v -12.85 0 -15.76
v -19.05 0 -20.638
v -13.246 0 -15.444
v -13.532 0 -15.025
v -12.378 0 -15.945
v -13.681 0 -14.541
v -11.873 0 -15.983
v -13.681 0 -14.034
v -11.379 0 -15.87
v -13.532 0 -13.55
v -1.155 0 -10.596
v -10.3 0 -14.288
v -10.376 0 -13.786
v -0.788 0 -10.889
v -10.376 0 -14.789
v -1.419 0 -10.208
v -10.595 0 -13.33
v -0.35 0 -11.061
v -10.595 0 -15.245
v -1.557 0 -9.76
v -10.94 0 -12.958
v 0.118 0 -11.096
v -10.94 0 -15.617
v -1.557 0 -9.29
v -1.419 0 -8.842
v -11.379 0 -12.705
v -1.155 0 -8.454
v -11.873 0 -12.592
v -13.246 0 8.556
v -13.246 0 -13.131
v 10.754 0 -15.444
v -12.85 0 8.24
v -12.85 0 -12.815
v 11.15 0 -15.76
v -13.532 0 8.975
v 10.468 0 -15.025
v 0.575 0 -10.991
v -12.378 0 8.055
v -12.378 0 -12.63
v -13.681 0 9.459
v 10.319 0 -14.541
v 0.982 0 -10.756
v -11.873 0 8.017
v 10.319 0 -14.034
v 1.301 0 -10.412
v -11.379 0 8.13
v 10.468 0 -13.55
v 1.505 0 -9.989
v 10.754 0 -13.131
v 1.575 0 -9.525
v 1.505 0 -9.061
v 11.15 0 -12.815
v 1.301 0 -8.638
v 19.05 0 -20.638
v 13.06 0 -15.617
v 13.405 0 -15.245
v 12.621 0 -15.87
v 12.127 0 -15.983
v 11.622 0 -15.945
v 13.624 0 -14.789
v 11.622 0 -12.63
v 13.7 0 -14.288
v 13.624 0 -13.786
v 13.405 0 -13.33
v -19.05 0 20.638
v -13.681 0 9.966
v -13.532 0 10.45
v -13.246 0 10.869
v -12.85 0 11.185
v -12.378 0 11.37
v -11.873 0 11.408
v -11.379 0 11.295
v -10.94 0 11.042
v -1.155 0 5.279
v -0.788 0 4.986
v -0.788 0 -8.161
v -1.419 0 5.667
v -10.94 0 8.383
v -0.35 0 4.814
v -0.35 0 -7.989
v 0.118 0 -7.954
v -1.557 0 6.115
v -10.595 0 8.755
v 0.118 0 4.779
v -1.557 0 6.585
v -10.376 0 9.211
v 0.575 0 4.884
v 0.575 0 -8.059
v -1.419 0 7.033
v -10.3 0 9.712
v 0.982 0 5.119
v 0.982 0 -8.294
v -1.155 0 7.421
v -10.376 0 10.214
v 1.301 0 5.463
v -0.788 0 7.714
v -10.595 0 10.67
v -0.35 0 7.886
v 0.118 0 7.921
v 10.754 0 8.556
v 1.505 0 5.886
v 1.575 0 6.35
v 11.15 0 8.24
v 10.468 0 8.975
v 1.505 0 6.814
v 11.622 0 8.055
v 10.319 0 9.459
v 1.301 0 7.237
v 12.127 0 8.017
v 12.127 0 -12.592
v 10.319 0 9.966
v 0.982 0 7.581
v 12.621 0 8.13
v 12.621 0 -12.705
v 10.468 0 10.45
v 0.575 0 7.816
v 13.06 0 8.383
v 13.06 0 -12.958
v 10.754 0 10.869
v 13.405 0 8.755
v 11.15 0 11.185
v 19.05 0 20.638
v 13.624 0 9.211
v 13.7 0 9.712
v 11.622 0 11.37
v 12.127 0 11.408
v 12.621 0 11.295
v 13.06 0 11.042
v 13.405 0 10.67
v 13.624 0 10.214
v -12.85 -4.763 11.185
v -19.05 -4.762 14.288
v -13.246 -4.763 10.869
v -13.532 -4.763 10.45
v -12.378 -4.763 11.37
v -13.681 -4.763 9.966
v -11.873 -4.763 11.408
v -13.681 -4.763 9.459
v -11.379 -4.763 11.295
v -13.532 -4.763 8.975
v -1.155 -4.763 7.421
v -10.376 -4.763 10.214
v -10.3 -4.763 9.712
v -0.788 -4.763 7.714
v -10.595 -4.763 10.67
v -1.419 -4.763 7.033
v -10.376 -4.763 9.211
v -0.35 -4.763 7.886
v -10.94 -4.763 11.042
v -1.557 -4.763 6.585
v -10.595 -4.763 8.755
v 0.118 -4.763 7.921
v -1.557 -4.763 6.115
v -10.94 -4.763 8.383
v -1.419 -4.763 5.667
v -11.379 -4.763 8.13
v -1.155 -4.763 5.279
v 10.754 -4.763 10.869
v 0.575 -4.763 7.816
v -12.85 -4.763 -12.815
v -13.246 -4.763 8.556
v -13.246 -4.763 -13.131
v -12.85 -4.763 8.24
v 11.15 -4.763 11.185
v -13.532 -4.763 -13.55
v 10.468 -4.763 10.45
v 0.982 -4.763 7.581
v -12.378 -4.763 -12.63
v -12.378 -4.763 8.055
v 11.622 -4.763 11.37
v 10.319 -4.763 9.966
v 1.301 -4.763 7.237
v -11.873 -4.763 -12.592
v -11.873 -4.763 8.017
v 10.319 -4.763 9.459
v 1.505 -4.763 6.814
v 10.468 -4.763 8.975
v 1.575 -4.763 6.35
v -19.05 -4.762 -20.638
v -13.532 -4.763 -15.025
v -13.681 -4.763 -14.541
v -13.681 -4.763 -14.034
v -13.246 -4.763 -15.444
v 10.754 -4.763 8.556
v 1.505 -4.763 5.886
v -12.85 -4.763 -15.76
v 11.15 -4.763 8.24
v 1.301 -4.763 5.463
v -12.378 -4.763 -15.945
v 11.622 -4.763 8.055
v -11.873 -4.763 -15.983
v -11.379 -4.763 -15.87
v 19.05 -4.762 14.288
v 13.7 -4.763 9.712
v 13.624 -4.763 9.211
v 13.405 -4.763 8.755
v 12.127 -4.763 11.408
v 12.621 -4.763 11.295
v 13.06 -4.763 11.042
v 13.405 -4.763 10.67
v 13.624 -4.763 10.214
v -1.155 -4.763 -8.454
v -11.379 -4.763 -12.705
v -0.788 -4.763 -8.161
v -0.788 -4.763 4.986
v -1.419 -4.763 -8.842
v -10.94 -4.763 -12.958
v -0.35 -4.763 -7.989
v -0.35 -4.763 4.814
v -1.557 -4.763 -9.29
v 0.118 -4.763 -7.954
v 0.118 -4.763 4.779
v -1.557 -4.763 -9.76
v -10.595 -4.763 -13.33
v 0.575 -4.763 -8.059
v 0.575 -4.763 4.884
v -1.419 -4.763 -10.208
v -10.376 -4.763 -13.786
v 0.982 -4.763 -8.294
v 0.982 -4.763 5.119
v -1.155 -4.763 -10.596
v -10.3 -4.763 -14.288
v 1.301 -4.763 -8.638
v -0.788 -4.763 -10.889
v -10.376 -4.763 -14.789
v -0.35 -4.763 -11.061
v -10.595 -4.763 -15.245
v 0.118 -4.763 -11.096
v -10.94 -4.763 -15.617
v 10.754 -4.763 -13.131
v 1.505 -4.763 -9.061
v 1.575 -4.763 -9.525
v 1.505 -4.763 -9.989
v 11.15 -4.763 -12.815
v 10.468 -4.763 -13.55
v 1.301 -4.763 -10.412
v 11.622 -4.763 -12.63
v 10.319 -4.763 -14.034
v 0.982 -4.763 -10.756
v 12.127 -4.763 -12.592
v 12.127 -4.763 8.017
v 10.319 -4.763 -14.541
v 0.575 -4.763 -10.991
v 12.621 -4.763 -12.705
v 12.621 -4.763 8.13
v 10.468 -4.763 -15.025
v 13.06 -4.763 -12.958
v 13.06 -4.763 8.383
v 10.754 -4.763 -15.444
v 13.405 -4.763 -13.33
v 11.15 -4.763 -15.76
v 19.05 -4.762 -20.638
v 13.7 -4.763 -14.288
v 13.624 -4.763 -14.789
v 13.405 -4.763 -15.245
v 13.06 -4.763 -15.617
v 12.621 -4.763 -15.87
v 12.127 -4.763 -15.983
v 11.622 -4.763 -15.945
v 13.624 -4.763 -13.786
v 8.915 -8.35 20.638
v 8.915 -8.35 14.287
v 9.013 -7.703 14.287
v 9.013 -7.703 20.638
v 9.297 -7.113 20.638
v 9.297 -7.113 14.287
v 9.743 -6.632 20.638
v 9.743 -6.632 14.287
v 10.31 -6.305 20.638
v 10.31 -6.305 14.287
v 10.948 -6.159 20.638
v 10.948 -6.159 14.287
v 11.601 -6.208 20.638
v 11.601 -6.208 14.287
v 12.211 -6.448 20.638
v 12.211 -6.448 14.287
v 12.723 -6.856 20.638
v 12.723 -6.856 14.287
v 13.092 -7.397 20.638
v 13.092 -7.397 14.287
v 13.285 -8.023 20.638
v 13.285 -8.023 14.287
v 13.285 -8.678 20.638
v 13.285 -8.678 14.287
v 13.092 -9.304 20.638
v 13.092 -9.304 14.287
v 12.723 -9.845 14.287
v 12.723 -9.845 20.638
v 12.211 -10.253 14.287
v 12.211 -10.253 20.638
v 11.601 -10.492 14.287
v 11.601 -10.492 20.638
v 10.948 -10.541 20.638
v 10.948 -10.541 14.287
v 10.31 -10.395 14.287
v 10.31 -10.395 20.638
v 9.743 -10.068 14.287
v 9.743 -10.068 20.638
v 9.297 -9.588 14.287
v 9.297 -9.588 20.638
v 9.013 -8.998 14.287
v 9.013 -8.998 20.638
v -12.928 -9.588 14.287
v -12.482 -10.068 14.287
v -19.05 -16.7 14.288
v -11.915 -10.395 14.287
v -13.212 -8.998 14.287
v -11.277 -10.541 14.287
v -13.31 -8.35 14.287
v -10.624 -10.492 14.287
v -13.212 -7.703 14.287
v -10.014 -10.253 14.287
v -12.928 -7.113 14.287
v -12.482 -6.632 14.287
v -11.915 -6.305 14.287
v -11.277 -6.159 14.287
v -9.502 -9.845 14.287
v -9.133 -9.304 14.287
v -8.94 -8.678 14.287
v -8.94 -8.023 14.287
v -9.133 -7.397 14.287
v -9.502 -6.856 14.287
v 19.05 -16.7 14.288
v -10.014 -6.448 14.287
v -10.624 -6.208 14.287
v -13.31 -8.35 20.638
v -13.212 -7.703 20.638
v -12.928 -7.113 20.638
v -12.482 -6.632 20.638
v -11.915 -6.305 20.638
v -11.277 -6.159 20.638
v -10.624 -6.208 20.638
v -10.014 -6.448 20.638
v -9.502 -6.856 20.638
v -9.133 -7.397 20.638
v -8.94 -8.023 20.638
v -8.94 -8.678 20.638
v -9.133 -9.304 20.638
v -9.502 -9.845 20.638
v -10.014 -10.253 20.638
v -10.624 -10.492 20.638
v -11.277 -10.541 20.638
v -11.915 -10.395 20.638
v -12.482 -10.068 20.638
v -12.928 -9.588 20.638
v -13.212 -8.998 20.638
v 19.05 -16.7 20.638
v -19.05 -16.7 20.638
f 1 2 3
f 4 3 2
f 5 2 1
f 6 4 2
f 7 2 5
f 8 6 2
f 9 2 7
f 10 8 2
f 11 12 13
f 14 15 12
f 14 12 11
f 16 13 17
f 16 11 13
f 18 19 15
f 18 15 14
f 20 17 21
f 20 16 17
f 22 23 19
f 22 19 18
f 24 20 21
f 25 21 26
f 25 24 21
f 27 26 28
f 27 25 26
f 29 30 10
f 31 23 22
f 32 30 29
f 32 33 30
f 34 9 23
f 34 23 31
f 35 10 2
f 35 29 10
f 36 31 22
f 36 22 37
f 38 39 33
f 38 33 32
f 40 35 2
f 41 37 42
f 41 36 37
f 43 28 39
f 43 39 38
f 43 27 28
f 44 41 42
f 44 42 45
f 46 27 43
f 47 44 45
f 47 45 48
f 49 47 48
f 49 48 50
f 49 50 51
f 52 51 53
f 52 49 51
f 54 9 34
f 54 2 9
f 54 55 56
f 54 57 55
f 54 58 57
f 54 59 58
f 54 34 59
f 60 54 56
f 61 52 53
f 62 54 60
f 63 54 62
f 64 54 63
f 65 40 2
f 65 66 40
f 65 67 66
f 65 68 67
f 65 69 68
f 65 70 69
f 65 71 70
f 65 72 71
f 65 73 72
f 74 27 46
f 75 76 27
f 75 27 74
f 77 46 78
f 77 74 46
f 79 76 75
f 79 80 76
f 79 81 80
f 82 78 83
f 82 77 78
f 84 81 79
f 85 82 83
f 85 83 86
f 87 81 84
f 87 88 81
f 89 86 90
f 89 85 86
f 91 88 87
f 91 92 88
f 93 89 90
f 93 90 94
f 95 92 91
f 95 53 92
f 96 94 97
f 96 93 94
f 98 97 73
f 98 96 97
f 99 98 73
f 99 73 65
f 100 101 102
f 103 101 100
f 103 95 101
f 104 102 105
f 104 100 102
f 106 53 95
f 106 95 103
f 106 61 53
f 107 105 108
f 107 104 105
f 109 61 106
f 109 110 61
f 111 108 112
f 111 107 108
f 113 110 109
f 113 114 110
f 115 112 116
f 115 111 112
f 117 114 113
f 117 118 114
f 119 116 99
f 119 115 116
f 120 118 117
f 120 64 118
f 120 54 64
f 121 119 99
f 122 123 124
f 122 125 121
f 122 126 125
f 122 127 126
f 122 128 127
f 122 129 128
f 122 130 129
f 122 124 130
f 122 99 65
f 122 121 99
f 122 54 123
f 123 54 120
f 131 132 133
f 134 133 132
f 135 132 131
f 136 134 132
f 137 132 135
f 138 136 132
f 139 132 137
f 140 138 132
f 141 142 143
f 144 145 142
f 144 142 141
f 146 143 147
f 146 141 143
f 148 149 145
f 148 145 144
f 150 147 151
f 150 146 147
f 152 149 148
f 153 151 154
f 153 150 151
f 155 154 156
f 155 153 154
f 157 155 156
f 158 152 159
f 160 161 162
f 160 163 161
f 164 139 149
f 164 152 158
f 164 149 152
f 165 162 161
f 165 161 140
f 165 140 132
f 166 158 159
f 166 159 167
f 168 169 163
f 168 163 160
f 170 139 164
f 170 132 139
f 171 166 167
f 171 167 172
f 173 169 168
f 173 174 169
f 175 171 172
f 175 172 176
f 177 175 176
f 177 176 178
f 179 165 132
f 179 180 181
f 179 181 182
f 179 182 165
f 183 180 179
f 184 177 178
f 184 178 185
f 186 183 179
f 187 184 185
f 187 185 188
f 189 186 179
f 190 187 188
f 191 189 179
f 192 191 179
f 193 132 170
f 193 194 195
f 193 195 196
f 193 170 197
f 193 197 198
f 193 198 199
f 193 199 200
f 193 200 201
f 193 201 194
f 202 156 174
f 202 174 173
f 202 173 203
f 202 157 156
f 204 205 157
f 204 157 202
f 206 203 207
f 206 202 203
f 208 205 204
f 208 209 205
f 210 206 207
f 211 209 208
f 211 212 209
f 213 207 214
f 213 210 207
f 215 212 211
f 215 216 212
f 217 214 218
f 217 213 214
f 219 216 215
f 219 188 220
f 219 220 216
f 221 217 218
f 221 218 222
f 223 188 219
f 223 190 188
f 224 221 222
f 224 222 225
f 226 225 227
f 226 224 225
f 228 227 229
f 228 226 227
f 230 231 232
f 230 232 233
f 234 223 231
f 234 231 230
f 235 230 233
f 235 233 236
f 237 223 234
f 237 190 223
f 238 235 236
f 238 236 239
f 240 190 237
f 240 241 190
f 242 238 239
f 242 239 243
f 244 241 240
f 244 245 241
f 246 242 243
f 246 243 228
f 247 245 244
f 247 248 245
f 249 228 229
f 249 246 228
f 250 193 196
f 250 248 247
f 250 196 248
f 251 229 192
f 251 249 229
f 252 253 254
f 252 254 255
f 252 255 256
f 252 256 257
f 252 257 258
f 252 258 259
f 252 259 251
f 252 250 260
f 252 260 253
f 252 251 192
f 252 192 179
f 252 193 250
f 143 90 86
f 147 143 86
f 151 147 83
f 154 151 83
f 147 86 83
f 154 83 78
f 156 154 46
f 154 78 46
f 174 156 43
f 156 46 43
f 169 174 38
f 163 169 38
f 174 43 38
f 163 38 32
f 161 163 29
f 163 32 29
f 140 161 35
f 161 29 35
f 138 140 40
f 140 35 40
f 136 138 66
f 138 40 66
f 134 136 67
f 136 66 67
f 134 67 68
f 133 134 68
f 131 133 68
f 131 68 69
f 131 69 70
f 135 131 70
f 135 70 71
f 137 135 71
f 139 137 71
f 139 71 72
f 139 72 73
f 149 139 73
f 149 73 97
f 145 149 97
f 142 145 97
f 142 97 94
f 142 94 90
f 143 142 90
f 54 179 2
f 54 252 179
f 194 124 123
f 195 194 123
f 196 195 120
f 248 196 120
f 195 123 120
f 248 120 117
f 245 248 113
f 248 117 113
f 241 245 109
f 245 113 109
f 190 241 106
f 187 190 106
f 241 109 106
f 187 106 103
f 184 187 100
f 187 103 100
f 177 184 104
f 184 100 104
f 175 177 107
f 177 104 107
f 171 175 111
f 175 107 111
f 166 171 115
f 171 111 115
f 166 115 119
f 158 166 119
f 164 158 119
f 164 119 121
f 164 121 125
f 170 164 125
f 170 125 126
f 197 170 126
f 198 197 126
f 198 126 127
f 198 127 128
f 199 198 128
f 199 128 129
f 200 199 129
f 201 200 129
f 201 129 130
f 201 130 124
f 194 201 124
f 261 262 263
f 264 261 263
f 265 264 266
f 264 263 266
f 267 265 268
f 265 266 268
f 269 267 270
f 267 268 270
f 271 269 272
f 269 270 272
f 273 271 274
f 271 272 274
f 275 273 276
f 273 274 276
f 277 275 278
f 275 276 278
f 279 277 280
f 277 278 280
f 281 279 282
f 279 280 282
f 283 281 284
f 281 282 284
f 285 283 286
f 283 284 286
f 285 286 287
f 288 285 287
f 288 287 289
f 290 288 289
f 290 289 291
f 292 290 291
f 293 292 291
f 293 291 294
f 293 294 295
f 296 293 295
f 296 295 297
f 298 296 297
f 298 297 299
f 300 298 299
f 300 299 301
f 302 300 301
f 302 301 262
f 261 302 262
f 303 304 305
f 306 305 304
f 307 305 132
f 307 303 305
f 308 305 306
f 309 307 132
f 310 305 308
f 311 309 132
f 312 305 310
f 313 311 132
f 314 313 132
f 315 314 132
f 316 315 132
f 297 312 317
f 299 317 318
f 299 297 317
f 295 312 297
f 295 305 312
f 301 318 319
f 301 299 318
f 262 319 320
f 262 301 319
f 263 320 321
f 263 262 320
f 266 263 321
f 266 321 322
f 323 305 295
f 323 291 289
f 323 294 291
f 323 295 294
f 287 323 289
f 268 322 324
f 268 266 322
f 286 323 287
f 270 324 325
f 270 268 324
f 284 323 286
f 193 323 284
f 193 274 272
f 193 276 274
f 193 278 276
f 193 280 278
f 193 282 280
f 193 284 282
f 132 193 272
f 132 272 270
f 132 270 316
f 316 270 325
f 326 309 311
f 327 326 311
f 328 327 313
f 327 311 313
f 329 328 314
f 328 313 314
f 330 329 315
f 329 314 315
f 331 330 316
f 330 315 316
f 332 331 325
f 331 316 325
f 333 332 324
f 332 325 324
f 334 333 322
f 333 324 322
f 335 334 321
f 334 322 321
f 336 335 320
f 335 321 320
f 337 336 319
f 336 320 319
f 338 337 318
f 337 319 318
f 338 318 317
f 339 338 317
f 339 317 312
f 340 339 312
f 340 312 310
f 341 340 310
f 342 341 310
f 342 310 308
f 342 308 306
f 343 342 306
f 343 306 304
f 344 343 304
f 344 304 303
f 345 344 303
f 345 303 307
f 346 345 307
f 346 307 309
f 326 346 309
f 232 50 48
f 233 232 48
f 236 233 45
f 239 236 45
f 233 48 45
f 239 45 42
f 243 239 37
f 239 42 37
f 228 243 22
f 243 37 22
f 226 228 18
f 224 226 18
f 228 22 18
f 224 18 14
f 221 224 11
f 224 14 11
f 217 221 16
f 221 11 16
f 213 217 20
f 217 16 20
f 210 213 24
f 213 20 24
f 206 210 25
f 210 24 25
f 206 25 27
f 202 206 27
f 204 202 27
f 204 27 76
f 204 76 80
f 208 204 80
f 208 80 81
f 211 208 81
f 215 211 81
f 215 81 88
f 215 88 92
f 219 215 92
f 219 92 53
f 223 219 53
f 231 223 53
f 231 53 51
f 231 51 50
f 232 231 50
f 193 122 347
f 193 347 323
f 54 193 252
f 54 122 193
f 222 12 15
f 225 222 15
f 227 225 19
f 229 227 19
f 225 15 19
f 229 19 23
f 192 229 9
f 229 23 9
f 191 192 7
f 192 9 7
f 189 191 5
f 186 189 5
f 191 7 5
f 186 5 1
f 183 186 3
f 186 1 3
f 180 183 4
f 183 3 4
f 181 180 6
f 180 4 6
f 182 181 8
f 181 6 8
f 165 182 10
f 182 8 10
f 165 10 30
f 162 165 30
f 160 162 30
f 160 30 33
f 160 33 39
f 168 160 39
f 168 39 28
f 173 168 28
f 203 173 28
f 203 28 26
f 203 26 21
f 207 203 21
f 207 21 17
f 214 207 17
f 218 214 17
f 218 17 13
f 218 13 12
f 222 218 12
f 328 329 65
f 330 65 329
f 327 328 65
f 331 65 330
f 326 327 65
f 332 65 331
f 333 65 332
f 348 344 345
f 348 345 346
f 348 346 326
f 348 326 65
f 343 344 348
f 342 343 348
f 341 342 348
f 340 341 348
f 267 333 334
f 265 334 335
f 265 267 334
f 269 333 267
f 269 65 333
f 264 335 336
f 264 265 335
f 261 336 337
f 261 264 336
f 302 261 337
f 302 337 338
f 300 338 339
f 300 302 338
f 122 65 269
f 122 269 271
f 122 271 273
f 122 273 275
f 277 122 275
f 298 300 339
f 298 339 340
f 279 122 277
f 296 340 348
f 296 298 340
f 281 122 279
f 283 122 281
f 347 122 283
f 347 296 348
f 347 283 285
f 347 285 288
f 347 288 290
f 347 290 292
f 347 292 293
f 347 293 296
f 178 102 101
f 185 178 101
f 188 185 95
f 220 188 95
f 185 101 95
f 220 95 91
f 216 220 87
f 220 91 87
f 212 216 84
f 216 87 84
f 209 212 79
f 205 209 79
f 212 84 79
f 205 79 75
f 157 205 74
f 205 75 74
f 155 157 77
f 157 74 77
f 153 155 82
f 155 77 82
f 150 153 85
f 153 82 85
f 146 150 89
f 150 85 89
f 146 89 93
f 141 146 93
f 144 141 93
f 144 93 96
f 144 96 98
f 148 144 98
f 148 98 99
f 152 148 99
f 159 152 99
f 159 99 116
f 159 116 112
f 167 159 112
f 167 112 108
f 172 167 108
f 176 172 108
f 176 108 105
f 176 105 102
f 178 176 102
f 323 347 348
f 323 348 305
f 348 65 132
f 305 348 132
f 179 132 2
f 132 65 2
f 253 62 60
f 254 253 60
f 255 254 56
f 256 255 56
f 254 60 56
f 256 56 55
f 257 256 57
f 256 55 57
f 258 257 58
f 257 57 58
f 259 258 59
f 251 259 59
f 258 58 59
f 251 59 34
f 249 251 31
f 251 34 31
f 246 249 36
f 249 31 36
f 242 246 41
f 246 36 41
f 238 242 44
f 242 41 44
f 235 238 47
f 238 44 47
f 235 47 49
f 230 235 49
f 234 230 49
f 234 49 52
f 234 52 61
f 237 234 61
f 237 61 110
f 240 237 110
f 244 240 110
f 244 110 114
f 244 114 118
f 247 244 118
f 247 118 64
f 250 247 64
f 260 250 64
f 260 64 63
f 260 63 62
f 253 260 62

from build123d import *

# Parameters (mm, degrees)
BOSS_EXTRUDE1_DEPTH                = 19.05
M3_CLEARANCE_HOLE1_D               = 3.4
TAPPED_HOLE_FOR_M3X0_5_HELICOIL1_D = 3.15
TAPPED_HOLE_FOR_8_32_HELICOIL1_D   = 4.3942


with BuildPart() as part:
    # Sketch1 → Boss-Extrude1 (new body, symmetric)
    with BuildSketch(Plane(origin=(0, 0, 0), x_dir=(0, 0, -1), z_dir=(1, 0, 0))):
        Polygon((20.6375, 0), (-20.6375, 0), (-20.6375, -16.7005), (-14.2875, -16.7005), (-14.2875, -4.7625), (20.6375, -4.7625), align=None)
    extrude(amount=BOSS_EXTRUDE1_DEPTH, both=True)

    # M3 Clearance Hole1 (through all)
    with Locations(Plane(origin=(0, -4.7625, 0), x_dir=(-1, 0, 0), z_dir=(0, -1, 0))):
        with Locations((-12, 14.2875), (12, 14.2875), (12, -9.7125), (-12, -9.7125)):
            Hole(M3_CLEARANCE_HOLE1_D / 2)

    # Tapped Hole for M3x0.5 Helicoil1 (through all)
    with Locations(Plane(origin=(0, -4.7625, 0), x_dir=(-1, 0, 0), z_dir=(0, -1, 0))):
        with Locations((0, -6.35), (0, 9.525)):
            Hole(TAPPED_HOLE_FOR_M3X0_5_HELICOIL1_D / 2)

    # Tapped Hole for #8-32 Helicoil1 (through all)
    with Locations(Plane.XY.offset(20.6375)):
        with Locations((-11.1125, -8.35025), (11.1125, -8.35025)):
            Hole(TAPPED_HOLE_FOR_8_32_HELICOIL1_D / 2)


solid = part.part
